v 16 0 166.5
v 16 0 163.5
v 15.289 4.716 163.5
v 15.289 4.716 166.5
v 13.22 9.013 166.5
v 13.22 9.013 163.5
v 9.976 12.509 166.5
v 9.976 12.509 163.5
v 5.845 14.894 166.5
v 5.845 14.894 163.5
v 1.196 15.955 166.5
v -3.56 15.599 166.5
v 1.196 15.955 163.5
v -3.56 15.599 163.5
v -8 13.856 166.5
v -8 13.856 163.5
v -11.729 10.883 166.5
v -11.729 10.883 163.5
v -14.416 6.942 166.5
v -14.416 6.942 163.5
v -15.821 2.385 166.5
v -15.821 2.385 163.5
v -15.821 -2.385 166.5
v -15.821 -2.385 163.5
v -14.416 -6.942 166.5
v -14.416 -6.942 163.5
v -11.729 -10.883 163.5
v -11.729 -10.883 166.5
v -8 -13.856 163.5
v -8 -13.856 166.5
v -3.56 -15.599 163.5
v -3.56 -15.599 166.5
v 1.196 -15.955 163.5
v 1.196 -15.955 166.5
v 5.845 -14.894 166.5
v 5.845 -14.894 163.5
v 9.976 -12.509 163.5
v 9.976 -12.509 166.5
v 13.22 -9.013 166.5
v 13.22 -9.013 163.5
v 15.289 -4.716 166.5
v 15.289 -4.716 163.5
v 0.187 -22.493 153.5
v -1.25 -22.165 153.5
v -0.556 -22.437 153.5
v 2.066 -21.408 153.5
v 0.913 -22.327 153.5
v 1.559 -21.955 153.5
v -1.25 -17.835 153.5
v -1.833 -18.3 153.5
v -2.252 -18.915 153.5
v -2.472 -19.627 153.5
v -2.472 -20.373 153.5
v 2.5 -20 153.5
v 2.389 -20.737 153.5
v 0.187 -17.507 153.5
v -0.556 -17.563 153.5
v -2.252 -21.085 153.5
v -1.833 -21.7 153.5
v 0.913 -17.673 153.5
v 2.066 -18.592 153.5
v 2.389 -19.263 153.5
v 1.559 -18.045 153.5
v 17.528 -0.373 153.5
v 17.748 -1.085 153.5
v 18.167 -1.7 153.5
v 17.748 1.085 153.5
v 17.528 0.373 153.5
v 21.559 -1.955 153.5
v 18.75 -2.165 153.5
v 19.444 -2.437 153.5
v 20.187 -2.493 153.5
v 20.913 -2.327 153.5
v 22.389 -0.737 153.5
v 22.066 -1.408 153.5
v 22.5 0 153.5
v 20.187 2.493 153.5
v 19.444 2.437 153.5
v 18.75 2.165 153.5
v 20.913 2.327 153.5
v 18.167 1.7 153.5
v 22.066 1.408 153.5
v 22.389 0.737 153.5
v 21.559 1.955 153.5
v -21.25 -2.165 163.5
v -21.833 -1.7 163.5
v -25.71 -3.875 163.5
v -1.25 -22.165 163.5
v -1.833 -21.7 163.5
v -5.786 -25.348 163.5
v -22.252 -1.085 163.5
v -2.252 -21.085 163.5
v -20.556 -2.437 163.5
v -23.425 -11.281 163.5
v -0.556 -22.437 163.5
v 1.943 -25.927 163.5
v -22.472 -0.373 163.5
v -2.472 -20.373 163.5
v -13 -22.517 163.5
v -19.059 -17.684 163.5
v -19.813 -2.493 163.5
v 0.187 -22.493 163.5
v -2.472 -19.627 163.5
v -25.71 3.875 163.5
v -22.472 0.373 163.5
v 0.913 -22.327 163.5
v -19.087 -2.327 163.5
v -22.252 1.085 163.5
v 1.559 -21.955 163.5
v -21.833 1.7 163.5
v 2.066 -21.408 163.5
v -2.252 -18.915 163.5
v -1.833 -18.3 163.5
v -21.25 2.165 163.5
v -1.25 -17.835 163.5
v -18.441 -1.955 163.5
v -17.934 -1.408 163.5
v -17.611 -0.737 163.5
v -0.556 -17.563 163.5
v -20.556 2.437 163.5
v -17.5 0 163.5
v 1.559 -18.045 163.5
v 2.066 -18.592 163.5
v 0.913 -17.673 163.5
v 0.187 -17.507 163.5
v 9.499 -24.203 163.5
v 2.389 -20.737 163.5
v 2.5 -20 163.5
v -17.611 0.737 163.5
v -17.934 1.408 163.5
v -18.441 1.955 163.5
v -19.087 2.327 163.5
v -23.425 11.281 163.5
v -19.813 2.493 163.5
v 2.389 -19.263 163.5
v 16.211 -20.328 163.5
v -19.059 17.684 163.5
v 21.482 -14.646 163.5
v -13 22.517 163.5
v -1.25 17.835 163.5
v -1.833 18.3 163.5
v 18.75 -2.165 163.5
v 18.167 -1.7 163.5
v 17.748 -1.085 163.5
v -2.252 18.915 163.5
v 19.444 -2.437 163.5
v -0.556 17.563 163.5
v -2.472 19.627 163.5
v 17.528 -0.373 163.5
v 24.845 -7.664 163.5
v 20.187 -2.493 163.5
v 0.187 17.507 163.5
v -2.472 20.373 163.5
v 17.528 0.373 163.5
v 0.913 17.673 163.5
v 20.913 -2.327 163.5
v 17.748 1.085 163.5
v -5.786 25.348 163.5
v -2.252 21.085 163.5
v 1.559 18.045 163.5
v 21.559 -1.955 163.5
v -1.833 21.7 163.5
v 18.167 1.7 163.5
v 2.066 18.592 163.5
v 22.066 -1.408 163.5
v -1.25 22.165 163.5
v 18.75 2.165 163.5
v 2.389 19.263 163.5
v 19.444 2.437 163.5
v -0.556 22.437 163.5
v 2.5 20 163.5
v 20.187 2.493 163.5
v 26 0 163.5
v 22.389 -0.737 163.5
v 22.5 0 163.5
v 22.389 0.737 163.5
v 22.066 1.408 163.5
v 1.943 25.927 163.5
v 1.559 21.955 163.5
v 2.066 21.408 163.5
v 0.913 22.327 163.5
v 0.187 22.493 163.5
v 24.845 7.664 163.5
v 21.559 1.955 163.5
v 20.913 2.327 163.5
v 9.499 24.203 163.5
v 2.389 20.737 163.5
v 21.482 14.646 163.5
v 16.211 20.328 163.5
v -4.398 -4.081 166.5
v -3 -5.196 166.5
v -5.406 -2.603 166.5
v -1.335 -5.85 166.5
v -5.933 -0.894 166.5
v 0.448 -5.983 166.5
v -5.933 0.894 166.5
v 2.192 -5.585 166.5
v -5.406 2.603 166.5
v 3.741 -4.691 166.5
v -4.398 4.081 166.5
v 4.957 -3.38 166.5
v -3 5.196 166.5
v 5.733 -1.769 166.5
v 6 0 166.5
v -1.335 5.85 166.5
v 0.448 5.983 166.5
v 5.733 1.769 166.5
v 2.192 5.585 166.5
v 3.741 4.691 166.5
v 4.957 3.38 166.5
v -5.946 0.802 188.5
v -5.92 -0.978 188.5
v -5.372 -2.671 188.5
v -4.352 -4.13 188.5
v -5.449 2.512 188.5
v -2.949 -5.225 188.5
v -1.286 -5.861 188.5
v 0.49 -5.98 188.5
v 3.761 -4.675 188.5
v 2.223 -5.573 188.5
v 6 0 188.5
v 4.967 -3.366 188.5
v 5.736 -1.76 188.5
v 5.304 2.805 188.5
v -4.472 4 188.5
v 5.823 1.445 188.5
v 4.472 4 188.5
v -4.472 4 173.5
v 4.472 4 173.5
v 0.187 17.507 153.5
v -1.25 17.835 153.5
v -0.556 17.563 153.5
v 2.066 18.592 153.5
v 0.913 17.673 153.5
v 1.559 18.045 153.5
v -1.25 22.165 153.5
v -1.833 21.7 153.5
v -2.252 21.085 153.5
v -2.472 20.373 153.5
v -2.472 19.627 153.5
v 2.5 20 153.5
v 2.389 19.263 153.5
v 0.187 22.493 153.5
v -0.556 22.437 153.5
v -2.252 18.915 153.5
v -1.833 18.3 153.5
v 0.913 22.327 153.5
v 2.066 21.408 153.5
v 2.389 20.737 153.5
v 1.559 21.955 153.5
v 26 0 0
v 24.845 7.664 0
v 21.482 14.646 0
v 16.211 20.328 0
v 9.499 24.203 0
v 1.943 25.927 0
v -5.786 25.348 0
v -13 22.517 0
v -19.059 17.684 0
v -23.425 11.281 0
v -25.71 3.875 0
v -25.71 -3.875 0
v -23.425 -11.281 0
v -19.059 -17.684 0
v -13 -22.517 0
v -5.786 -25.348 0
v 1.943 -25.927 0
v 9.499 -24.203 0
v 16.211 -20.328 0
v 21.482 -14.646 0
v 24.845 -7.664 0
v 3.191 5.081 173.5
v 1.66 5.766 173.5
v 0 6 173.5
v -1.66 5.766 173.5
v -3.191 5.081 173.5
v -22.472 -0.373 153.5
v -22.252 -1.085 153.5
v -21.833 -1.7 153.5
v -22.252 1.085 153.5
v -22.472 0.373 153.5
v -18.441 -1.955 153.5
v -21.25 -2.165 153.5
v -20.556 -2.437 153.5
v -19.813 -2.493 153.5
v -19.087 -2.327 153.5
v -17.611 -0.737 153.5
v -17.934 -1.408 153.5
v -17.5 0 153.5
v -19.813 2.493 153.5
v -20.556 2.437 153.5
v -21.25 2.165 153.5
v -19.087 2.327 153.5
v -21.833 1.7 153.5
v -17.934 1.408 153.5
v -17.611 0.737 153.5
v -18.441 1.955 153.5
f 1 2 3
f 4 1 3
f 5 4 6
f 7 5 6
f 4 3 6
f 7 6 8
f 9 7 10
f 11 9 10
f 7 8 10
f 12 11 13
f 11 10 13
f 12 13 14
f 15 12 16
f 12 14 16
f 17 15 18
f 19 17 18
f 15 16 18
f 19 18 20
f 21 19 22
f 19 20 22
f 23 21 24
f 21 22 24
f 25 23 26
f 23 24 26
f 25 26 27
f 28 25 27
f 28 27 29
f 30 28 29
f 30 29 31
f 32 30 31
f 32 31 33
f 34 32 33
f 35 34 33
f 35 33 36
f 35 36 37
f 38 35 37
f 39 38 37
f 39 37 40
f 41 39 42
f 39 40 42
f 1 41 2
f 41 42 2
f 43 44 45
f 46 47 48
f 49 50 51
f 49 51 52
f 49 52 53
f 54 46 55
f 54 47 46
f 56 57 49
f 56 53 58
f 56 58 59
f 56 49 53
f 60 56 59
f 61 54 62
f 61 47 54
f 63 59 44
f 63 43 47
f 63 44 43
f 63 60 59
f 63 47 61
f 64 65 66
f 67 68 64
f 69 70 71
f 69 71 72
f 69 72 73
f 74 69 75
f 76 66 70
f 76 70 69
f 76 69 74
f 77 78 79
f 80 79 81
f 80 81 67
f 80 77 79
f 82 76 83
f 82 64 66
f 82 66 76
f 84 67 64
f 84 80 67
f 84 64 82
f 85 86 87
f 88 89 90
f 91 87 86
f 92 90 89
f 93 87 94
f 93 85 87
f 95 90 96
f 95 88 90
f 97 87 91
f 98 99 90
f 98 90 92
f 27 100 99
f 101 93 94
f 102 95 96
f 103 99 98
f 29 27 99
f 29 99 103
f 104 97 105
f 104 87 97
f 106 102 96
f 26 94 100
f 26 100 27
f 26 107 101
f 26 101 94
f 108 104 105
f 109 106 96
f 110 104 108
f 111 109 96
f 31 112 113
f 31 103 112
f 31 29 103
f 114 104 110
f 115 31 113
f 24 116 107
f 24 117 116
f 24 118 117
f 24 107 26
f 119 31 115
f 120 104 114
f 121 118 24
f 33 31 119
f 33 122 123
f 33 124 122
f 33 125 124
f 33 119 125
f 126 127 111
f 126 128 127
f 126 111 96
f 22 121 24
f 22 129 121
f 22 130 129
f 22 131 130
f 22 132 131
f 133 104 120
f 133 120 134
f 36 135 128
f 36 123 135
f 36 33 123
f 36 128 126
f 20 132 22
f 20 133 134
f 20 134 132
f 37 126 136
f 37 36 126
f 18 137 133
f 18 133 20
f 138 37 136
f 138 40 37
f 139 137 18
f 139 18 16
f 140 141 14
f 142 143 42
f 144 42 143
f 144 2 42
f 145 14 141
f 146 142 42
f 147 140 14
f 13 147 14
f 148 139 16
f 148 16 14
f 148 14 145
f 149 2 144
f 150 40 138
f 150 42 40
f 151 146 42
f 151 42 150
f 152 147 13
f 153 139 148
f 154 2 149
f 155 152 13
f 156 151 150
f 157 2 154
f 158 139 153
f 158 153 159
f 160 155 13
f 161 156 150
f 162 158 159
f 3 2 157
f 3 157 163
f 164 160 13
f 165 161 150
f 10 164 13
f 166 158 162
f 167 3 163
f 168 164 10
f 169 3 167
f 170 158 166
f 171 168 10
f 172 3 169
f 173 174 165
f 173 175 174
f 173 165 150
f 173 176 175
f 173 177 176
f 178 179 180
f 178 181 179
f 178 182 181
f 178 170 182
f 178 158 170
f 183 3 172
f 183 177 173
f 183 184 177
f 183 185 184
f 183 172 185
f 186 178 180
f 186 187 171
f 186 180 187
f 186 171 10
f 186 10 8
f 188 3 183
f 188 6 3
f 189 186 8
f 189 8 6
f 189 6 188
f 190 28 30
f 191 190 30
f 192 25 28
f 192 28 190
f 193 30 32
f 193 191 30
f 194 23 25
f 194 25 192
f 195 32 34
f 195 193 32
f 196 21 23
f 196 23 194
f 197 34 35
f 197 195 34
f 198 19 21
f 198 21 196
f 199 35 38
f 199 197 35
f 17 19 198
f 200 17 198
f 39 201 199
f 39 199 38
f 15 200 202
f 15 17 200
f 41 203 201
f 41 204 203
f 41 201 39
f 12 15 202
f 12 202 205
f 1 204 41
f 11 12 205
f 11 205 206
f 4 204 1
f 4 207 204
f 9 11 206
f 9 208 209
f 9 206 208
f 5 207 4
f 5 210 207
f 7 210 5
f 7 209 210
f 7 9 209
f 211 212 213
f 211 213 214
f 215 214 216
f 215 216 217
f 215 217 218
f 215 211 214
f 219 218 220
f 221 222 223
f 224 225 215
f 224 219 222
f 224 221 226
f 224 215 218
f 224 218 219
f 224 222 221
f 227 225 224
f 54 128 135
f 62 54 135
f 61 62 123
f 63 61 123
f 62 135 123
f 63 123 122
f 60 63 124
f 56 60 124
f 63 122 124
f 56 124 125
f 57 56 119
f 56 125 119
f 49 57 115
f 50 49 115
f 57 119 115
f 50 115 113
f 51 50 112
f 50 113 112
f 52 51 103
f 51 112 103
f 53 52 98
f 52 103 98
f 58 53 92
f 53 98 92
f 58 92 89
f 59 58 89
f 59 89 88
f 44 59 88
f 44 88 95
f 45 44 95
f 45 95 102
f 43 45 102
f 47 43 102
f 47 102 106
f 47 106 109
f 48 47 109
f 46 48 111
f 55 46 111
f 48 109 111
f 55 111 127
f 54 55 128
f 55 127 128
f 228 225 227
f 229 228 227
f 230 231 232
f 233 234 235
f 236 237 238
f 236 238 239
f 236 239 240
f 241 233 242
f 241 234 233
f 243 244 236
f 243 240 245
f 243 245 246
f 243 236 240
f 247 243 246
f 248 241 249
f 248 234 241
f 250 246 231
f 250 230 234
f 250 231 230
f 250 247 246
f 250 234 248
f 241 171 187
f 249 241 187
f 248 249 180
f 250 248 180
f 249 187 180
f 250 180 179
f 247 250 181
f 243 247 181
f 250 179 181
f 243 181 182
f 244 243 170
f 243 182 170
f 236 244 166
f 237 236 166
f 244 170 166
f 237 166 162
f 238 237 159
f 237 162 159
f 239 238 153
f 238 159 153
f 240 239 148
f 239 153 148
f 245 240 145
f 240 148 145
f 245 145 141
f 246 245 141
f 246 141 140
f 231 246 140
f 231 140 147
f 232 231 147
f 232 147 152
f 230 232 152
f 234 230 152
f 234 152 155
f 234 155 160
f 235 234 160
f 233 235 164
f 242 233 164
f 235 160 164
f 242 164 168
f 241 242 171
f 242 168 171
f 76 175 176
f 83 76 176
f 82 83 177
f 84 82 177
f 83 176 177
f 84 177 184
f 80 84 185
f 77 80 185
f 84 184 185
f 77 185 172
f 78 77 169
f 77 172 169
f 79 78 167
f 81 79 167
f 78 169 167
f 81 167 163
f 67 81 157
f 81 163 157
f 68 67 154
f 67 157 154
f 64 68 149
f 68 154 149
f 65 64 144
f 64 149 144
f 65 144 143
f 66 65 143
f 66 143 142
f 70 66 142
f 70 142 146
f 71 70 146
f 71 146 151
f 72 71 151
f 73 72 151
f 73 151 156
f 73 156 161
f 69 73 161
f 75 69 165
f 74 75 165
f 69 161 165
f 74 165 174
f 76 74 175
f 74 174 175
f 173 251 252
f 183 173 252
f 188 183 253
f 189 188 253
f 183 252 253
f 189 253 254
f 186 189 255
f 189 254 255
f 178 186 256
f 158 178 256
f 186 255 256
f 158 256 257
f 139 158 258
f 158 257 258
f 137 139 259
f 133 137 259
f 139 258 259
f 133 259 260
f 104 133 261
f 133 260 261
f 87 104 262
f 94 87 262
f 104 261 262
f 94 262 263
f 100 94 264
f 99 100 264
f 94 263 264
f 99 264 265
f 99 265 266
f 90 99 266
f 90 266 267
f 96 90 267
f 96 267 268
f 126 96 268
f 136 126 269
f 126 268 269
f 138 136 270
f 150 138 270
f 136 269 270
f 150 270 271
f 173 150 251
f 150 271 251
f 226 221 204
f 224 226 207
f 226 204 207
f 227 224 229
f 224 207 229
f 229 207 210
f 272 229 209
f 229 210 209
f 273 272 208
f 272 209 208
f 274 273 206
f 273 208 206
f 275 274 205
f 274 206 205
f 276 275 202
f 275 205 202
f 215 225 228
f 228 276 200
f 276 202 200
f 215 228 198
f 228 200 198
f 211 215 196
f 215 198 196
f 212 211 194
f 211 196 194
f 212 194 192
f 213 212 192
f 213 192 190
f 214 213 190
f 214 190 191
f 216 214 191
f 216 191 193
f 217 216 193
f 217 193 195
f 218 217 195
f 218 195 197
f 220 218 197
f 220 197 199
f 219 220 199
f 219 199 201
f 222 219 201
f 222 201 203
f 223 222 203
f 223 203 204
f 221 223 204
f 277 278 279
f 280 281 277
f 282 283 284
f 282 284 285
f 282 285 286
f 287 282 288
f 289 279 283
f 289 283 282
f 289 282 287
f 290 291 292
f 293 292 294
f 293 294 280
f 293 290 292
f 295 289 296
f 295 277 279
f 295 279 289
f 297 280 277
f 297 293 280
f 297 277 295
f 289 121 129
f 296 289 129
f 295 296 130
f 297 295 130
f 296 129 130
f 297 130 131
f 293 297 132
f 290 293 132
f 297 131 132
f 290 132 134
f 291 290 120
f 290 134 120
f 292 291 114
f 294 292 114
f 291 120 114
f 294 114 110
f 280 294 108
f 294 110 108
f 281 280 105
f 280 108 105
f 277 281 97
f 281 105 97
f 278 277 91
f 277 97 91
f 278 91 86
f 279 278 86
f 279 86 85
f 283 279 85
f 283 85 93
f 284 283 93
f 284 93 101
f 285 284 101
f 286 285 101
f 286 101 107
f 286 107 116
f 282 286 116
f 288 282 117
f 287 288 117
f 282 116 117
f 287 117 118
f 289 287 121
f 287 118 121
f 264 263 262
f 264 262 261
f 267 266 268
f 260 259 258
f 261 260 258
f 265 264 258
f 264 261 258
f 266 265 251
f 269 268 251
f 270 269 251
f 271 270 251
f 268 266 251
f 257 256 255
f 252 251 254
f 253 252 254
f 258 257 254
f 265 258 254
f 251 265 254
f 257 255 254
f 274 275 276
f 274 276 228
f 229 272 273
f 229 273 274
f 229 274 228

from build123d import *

# Parameters (mm, degrees)
SKETCH1_R           = 26
BOSS_EXTRUDE1_DEPTH = 163.5
SKETCH2_R           = 16
BOSS_EXTRUDE2_DEPTH = 3
SKETCH3_R           = 6
BOSS_EXTRUDE3_DEPTH = 22
CUT_EXTRUDE1_DEPTH  = 15
SKETCH6_R           = 2.5
CUT_EXTRUDE2_DEPTH  = 10


with BuildPart() as part:
    # Sketch1 → Boss-Extrude1 (new body)
    with BuildSketch(Plane.XY):
        Circle(SKETCH1_R)
    extrude(amount=BOSS_EXTRUDE1_DEPTH)

    # Sketch2 → Boss-Extrude2 (add)
    with BuildSketch(Plane.XY.offset(163.5)):
        Circle(SKETCH2_R)
    extrude(amount=BOSS_EXTRUDE2_DEPTH)

    # Sketch3 → Boss-Extrude3 (add)
    with BuildSketch(Plane.XY.offset(166.5)):
        Circle(SKETCH3_R)
    extrude(amount=BOSS_EXTRUDE3_DEPTH)

    # Sketch4 → Cut-Extrude1 (cut)
    with BuildSketch(Plane.XY.offset(188.5)):
        with BuildLine():
            ThreePointArc((0, 6), (-2.449489743, 5.477225575), (-4.472135955, 4))
            Line((-4.472135955, 4), (0, 4))
            Line((0, 4), (0, 6))
        make_face()
        with BuildLine():
            Line((0, 6), (0, 4))
            Line((0, 4), (4.472135955, 4))
            ThreePointArc((4.472135955, 4), (2.449489743, 5.477225575), (0, 6))
        make_face()
    extrude(amount=-CUT_EXTRUDE1_DEPTH, mode=Mode.SUBTRACT)

    # Sketch6 → Cut-Extrude2 (cut)
    with BuildSketch(Plane.XY.offset(163.5)):
        with Locations((0, 20)):
            Circle(SKETCH6_R)
        with Locations((20, 0)):
            Circle(SKETCH6_R)
        with Locations((0, -20)):
            Circle(SKETCH6_R)
        with Locations((-20, 0)):
            Circle(SKETCH6_R)
    extrude(amount=-CUT_EXTRUDE2_DEPTH, mode=Mode.SUBTRACT)


solid = part.part
